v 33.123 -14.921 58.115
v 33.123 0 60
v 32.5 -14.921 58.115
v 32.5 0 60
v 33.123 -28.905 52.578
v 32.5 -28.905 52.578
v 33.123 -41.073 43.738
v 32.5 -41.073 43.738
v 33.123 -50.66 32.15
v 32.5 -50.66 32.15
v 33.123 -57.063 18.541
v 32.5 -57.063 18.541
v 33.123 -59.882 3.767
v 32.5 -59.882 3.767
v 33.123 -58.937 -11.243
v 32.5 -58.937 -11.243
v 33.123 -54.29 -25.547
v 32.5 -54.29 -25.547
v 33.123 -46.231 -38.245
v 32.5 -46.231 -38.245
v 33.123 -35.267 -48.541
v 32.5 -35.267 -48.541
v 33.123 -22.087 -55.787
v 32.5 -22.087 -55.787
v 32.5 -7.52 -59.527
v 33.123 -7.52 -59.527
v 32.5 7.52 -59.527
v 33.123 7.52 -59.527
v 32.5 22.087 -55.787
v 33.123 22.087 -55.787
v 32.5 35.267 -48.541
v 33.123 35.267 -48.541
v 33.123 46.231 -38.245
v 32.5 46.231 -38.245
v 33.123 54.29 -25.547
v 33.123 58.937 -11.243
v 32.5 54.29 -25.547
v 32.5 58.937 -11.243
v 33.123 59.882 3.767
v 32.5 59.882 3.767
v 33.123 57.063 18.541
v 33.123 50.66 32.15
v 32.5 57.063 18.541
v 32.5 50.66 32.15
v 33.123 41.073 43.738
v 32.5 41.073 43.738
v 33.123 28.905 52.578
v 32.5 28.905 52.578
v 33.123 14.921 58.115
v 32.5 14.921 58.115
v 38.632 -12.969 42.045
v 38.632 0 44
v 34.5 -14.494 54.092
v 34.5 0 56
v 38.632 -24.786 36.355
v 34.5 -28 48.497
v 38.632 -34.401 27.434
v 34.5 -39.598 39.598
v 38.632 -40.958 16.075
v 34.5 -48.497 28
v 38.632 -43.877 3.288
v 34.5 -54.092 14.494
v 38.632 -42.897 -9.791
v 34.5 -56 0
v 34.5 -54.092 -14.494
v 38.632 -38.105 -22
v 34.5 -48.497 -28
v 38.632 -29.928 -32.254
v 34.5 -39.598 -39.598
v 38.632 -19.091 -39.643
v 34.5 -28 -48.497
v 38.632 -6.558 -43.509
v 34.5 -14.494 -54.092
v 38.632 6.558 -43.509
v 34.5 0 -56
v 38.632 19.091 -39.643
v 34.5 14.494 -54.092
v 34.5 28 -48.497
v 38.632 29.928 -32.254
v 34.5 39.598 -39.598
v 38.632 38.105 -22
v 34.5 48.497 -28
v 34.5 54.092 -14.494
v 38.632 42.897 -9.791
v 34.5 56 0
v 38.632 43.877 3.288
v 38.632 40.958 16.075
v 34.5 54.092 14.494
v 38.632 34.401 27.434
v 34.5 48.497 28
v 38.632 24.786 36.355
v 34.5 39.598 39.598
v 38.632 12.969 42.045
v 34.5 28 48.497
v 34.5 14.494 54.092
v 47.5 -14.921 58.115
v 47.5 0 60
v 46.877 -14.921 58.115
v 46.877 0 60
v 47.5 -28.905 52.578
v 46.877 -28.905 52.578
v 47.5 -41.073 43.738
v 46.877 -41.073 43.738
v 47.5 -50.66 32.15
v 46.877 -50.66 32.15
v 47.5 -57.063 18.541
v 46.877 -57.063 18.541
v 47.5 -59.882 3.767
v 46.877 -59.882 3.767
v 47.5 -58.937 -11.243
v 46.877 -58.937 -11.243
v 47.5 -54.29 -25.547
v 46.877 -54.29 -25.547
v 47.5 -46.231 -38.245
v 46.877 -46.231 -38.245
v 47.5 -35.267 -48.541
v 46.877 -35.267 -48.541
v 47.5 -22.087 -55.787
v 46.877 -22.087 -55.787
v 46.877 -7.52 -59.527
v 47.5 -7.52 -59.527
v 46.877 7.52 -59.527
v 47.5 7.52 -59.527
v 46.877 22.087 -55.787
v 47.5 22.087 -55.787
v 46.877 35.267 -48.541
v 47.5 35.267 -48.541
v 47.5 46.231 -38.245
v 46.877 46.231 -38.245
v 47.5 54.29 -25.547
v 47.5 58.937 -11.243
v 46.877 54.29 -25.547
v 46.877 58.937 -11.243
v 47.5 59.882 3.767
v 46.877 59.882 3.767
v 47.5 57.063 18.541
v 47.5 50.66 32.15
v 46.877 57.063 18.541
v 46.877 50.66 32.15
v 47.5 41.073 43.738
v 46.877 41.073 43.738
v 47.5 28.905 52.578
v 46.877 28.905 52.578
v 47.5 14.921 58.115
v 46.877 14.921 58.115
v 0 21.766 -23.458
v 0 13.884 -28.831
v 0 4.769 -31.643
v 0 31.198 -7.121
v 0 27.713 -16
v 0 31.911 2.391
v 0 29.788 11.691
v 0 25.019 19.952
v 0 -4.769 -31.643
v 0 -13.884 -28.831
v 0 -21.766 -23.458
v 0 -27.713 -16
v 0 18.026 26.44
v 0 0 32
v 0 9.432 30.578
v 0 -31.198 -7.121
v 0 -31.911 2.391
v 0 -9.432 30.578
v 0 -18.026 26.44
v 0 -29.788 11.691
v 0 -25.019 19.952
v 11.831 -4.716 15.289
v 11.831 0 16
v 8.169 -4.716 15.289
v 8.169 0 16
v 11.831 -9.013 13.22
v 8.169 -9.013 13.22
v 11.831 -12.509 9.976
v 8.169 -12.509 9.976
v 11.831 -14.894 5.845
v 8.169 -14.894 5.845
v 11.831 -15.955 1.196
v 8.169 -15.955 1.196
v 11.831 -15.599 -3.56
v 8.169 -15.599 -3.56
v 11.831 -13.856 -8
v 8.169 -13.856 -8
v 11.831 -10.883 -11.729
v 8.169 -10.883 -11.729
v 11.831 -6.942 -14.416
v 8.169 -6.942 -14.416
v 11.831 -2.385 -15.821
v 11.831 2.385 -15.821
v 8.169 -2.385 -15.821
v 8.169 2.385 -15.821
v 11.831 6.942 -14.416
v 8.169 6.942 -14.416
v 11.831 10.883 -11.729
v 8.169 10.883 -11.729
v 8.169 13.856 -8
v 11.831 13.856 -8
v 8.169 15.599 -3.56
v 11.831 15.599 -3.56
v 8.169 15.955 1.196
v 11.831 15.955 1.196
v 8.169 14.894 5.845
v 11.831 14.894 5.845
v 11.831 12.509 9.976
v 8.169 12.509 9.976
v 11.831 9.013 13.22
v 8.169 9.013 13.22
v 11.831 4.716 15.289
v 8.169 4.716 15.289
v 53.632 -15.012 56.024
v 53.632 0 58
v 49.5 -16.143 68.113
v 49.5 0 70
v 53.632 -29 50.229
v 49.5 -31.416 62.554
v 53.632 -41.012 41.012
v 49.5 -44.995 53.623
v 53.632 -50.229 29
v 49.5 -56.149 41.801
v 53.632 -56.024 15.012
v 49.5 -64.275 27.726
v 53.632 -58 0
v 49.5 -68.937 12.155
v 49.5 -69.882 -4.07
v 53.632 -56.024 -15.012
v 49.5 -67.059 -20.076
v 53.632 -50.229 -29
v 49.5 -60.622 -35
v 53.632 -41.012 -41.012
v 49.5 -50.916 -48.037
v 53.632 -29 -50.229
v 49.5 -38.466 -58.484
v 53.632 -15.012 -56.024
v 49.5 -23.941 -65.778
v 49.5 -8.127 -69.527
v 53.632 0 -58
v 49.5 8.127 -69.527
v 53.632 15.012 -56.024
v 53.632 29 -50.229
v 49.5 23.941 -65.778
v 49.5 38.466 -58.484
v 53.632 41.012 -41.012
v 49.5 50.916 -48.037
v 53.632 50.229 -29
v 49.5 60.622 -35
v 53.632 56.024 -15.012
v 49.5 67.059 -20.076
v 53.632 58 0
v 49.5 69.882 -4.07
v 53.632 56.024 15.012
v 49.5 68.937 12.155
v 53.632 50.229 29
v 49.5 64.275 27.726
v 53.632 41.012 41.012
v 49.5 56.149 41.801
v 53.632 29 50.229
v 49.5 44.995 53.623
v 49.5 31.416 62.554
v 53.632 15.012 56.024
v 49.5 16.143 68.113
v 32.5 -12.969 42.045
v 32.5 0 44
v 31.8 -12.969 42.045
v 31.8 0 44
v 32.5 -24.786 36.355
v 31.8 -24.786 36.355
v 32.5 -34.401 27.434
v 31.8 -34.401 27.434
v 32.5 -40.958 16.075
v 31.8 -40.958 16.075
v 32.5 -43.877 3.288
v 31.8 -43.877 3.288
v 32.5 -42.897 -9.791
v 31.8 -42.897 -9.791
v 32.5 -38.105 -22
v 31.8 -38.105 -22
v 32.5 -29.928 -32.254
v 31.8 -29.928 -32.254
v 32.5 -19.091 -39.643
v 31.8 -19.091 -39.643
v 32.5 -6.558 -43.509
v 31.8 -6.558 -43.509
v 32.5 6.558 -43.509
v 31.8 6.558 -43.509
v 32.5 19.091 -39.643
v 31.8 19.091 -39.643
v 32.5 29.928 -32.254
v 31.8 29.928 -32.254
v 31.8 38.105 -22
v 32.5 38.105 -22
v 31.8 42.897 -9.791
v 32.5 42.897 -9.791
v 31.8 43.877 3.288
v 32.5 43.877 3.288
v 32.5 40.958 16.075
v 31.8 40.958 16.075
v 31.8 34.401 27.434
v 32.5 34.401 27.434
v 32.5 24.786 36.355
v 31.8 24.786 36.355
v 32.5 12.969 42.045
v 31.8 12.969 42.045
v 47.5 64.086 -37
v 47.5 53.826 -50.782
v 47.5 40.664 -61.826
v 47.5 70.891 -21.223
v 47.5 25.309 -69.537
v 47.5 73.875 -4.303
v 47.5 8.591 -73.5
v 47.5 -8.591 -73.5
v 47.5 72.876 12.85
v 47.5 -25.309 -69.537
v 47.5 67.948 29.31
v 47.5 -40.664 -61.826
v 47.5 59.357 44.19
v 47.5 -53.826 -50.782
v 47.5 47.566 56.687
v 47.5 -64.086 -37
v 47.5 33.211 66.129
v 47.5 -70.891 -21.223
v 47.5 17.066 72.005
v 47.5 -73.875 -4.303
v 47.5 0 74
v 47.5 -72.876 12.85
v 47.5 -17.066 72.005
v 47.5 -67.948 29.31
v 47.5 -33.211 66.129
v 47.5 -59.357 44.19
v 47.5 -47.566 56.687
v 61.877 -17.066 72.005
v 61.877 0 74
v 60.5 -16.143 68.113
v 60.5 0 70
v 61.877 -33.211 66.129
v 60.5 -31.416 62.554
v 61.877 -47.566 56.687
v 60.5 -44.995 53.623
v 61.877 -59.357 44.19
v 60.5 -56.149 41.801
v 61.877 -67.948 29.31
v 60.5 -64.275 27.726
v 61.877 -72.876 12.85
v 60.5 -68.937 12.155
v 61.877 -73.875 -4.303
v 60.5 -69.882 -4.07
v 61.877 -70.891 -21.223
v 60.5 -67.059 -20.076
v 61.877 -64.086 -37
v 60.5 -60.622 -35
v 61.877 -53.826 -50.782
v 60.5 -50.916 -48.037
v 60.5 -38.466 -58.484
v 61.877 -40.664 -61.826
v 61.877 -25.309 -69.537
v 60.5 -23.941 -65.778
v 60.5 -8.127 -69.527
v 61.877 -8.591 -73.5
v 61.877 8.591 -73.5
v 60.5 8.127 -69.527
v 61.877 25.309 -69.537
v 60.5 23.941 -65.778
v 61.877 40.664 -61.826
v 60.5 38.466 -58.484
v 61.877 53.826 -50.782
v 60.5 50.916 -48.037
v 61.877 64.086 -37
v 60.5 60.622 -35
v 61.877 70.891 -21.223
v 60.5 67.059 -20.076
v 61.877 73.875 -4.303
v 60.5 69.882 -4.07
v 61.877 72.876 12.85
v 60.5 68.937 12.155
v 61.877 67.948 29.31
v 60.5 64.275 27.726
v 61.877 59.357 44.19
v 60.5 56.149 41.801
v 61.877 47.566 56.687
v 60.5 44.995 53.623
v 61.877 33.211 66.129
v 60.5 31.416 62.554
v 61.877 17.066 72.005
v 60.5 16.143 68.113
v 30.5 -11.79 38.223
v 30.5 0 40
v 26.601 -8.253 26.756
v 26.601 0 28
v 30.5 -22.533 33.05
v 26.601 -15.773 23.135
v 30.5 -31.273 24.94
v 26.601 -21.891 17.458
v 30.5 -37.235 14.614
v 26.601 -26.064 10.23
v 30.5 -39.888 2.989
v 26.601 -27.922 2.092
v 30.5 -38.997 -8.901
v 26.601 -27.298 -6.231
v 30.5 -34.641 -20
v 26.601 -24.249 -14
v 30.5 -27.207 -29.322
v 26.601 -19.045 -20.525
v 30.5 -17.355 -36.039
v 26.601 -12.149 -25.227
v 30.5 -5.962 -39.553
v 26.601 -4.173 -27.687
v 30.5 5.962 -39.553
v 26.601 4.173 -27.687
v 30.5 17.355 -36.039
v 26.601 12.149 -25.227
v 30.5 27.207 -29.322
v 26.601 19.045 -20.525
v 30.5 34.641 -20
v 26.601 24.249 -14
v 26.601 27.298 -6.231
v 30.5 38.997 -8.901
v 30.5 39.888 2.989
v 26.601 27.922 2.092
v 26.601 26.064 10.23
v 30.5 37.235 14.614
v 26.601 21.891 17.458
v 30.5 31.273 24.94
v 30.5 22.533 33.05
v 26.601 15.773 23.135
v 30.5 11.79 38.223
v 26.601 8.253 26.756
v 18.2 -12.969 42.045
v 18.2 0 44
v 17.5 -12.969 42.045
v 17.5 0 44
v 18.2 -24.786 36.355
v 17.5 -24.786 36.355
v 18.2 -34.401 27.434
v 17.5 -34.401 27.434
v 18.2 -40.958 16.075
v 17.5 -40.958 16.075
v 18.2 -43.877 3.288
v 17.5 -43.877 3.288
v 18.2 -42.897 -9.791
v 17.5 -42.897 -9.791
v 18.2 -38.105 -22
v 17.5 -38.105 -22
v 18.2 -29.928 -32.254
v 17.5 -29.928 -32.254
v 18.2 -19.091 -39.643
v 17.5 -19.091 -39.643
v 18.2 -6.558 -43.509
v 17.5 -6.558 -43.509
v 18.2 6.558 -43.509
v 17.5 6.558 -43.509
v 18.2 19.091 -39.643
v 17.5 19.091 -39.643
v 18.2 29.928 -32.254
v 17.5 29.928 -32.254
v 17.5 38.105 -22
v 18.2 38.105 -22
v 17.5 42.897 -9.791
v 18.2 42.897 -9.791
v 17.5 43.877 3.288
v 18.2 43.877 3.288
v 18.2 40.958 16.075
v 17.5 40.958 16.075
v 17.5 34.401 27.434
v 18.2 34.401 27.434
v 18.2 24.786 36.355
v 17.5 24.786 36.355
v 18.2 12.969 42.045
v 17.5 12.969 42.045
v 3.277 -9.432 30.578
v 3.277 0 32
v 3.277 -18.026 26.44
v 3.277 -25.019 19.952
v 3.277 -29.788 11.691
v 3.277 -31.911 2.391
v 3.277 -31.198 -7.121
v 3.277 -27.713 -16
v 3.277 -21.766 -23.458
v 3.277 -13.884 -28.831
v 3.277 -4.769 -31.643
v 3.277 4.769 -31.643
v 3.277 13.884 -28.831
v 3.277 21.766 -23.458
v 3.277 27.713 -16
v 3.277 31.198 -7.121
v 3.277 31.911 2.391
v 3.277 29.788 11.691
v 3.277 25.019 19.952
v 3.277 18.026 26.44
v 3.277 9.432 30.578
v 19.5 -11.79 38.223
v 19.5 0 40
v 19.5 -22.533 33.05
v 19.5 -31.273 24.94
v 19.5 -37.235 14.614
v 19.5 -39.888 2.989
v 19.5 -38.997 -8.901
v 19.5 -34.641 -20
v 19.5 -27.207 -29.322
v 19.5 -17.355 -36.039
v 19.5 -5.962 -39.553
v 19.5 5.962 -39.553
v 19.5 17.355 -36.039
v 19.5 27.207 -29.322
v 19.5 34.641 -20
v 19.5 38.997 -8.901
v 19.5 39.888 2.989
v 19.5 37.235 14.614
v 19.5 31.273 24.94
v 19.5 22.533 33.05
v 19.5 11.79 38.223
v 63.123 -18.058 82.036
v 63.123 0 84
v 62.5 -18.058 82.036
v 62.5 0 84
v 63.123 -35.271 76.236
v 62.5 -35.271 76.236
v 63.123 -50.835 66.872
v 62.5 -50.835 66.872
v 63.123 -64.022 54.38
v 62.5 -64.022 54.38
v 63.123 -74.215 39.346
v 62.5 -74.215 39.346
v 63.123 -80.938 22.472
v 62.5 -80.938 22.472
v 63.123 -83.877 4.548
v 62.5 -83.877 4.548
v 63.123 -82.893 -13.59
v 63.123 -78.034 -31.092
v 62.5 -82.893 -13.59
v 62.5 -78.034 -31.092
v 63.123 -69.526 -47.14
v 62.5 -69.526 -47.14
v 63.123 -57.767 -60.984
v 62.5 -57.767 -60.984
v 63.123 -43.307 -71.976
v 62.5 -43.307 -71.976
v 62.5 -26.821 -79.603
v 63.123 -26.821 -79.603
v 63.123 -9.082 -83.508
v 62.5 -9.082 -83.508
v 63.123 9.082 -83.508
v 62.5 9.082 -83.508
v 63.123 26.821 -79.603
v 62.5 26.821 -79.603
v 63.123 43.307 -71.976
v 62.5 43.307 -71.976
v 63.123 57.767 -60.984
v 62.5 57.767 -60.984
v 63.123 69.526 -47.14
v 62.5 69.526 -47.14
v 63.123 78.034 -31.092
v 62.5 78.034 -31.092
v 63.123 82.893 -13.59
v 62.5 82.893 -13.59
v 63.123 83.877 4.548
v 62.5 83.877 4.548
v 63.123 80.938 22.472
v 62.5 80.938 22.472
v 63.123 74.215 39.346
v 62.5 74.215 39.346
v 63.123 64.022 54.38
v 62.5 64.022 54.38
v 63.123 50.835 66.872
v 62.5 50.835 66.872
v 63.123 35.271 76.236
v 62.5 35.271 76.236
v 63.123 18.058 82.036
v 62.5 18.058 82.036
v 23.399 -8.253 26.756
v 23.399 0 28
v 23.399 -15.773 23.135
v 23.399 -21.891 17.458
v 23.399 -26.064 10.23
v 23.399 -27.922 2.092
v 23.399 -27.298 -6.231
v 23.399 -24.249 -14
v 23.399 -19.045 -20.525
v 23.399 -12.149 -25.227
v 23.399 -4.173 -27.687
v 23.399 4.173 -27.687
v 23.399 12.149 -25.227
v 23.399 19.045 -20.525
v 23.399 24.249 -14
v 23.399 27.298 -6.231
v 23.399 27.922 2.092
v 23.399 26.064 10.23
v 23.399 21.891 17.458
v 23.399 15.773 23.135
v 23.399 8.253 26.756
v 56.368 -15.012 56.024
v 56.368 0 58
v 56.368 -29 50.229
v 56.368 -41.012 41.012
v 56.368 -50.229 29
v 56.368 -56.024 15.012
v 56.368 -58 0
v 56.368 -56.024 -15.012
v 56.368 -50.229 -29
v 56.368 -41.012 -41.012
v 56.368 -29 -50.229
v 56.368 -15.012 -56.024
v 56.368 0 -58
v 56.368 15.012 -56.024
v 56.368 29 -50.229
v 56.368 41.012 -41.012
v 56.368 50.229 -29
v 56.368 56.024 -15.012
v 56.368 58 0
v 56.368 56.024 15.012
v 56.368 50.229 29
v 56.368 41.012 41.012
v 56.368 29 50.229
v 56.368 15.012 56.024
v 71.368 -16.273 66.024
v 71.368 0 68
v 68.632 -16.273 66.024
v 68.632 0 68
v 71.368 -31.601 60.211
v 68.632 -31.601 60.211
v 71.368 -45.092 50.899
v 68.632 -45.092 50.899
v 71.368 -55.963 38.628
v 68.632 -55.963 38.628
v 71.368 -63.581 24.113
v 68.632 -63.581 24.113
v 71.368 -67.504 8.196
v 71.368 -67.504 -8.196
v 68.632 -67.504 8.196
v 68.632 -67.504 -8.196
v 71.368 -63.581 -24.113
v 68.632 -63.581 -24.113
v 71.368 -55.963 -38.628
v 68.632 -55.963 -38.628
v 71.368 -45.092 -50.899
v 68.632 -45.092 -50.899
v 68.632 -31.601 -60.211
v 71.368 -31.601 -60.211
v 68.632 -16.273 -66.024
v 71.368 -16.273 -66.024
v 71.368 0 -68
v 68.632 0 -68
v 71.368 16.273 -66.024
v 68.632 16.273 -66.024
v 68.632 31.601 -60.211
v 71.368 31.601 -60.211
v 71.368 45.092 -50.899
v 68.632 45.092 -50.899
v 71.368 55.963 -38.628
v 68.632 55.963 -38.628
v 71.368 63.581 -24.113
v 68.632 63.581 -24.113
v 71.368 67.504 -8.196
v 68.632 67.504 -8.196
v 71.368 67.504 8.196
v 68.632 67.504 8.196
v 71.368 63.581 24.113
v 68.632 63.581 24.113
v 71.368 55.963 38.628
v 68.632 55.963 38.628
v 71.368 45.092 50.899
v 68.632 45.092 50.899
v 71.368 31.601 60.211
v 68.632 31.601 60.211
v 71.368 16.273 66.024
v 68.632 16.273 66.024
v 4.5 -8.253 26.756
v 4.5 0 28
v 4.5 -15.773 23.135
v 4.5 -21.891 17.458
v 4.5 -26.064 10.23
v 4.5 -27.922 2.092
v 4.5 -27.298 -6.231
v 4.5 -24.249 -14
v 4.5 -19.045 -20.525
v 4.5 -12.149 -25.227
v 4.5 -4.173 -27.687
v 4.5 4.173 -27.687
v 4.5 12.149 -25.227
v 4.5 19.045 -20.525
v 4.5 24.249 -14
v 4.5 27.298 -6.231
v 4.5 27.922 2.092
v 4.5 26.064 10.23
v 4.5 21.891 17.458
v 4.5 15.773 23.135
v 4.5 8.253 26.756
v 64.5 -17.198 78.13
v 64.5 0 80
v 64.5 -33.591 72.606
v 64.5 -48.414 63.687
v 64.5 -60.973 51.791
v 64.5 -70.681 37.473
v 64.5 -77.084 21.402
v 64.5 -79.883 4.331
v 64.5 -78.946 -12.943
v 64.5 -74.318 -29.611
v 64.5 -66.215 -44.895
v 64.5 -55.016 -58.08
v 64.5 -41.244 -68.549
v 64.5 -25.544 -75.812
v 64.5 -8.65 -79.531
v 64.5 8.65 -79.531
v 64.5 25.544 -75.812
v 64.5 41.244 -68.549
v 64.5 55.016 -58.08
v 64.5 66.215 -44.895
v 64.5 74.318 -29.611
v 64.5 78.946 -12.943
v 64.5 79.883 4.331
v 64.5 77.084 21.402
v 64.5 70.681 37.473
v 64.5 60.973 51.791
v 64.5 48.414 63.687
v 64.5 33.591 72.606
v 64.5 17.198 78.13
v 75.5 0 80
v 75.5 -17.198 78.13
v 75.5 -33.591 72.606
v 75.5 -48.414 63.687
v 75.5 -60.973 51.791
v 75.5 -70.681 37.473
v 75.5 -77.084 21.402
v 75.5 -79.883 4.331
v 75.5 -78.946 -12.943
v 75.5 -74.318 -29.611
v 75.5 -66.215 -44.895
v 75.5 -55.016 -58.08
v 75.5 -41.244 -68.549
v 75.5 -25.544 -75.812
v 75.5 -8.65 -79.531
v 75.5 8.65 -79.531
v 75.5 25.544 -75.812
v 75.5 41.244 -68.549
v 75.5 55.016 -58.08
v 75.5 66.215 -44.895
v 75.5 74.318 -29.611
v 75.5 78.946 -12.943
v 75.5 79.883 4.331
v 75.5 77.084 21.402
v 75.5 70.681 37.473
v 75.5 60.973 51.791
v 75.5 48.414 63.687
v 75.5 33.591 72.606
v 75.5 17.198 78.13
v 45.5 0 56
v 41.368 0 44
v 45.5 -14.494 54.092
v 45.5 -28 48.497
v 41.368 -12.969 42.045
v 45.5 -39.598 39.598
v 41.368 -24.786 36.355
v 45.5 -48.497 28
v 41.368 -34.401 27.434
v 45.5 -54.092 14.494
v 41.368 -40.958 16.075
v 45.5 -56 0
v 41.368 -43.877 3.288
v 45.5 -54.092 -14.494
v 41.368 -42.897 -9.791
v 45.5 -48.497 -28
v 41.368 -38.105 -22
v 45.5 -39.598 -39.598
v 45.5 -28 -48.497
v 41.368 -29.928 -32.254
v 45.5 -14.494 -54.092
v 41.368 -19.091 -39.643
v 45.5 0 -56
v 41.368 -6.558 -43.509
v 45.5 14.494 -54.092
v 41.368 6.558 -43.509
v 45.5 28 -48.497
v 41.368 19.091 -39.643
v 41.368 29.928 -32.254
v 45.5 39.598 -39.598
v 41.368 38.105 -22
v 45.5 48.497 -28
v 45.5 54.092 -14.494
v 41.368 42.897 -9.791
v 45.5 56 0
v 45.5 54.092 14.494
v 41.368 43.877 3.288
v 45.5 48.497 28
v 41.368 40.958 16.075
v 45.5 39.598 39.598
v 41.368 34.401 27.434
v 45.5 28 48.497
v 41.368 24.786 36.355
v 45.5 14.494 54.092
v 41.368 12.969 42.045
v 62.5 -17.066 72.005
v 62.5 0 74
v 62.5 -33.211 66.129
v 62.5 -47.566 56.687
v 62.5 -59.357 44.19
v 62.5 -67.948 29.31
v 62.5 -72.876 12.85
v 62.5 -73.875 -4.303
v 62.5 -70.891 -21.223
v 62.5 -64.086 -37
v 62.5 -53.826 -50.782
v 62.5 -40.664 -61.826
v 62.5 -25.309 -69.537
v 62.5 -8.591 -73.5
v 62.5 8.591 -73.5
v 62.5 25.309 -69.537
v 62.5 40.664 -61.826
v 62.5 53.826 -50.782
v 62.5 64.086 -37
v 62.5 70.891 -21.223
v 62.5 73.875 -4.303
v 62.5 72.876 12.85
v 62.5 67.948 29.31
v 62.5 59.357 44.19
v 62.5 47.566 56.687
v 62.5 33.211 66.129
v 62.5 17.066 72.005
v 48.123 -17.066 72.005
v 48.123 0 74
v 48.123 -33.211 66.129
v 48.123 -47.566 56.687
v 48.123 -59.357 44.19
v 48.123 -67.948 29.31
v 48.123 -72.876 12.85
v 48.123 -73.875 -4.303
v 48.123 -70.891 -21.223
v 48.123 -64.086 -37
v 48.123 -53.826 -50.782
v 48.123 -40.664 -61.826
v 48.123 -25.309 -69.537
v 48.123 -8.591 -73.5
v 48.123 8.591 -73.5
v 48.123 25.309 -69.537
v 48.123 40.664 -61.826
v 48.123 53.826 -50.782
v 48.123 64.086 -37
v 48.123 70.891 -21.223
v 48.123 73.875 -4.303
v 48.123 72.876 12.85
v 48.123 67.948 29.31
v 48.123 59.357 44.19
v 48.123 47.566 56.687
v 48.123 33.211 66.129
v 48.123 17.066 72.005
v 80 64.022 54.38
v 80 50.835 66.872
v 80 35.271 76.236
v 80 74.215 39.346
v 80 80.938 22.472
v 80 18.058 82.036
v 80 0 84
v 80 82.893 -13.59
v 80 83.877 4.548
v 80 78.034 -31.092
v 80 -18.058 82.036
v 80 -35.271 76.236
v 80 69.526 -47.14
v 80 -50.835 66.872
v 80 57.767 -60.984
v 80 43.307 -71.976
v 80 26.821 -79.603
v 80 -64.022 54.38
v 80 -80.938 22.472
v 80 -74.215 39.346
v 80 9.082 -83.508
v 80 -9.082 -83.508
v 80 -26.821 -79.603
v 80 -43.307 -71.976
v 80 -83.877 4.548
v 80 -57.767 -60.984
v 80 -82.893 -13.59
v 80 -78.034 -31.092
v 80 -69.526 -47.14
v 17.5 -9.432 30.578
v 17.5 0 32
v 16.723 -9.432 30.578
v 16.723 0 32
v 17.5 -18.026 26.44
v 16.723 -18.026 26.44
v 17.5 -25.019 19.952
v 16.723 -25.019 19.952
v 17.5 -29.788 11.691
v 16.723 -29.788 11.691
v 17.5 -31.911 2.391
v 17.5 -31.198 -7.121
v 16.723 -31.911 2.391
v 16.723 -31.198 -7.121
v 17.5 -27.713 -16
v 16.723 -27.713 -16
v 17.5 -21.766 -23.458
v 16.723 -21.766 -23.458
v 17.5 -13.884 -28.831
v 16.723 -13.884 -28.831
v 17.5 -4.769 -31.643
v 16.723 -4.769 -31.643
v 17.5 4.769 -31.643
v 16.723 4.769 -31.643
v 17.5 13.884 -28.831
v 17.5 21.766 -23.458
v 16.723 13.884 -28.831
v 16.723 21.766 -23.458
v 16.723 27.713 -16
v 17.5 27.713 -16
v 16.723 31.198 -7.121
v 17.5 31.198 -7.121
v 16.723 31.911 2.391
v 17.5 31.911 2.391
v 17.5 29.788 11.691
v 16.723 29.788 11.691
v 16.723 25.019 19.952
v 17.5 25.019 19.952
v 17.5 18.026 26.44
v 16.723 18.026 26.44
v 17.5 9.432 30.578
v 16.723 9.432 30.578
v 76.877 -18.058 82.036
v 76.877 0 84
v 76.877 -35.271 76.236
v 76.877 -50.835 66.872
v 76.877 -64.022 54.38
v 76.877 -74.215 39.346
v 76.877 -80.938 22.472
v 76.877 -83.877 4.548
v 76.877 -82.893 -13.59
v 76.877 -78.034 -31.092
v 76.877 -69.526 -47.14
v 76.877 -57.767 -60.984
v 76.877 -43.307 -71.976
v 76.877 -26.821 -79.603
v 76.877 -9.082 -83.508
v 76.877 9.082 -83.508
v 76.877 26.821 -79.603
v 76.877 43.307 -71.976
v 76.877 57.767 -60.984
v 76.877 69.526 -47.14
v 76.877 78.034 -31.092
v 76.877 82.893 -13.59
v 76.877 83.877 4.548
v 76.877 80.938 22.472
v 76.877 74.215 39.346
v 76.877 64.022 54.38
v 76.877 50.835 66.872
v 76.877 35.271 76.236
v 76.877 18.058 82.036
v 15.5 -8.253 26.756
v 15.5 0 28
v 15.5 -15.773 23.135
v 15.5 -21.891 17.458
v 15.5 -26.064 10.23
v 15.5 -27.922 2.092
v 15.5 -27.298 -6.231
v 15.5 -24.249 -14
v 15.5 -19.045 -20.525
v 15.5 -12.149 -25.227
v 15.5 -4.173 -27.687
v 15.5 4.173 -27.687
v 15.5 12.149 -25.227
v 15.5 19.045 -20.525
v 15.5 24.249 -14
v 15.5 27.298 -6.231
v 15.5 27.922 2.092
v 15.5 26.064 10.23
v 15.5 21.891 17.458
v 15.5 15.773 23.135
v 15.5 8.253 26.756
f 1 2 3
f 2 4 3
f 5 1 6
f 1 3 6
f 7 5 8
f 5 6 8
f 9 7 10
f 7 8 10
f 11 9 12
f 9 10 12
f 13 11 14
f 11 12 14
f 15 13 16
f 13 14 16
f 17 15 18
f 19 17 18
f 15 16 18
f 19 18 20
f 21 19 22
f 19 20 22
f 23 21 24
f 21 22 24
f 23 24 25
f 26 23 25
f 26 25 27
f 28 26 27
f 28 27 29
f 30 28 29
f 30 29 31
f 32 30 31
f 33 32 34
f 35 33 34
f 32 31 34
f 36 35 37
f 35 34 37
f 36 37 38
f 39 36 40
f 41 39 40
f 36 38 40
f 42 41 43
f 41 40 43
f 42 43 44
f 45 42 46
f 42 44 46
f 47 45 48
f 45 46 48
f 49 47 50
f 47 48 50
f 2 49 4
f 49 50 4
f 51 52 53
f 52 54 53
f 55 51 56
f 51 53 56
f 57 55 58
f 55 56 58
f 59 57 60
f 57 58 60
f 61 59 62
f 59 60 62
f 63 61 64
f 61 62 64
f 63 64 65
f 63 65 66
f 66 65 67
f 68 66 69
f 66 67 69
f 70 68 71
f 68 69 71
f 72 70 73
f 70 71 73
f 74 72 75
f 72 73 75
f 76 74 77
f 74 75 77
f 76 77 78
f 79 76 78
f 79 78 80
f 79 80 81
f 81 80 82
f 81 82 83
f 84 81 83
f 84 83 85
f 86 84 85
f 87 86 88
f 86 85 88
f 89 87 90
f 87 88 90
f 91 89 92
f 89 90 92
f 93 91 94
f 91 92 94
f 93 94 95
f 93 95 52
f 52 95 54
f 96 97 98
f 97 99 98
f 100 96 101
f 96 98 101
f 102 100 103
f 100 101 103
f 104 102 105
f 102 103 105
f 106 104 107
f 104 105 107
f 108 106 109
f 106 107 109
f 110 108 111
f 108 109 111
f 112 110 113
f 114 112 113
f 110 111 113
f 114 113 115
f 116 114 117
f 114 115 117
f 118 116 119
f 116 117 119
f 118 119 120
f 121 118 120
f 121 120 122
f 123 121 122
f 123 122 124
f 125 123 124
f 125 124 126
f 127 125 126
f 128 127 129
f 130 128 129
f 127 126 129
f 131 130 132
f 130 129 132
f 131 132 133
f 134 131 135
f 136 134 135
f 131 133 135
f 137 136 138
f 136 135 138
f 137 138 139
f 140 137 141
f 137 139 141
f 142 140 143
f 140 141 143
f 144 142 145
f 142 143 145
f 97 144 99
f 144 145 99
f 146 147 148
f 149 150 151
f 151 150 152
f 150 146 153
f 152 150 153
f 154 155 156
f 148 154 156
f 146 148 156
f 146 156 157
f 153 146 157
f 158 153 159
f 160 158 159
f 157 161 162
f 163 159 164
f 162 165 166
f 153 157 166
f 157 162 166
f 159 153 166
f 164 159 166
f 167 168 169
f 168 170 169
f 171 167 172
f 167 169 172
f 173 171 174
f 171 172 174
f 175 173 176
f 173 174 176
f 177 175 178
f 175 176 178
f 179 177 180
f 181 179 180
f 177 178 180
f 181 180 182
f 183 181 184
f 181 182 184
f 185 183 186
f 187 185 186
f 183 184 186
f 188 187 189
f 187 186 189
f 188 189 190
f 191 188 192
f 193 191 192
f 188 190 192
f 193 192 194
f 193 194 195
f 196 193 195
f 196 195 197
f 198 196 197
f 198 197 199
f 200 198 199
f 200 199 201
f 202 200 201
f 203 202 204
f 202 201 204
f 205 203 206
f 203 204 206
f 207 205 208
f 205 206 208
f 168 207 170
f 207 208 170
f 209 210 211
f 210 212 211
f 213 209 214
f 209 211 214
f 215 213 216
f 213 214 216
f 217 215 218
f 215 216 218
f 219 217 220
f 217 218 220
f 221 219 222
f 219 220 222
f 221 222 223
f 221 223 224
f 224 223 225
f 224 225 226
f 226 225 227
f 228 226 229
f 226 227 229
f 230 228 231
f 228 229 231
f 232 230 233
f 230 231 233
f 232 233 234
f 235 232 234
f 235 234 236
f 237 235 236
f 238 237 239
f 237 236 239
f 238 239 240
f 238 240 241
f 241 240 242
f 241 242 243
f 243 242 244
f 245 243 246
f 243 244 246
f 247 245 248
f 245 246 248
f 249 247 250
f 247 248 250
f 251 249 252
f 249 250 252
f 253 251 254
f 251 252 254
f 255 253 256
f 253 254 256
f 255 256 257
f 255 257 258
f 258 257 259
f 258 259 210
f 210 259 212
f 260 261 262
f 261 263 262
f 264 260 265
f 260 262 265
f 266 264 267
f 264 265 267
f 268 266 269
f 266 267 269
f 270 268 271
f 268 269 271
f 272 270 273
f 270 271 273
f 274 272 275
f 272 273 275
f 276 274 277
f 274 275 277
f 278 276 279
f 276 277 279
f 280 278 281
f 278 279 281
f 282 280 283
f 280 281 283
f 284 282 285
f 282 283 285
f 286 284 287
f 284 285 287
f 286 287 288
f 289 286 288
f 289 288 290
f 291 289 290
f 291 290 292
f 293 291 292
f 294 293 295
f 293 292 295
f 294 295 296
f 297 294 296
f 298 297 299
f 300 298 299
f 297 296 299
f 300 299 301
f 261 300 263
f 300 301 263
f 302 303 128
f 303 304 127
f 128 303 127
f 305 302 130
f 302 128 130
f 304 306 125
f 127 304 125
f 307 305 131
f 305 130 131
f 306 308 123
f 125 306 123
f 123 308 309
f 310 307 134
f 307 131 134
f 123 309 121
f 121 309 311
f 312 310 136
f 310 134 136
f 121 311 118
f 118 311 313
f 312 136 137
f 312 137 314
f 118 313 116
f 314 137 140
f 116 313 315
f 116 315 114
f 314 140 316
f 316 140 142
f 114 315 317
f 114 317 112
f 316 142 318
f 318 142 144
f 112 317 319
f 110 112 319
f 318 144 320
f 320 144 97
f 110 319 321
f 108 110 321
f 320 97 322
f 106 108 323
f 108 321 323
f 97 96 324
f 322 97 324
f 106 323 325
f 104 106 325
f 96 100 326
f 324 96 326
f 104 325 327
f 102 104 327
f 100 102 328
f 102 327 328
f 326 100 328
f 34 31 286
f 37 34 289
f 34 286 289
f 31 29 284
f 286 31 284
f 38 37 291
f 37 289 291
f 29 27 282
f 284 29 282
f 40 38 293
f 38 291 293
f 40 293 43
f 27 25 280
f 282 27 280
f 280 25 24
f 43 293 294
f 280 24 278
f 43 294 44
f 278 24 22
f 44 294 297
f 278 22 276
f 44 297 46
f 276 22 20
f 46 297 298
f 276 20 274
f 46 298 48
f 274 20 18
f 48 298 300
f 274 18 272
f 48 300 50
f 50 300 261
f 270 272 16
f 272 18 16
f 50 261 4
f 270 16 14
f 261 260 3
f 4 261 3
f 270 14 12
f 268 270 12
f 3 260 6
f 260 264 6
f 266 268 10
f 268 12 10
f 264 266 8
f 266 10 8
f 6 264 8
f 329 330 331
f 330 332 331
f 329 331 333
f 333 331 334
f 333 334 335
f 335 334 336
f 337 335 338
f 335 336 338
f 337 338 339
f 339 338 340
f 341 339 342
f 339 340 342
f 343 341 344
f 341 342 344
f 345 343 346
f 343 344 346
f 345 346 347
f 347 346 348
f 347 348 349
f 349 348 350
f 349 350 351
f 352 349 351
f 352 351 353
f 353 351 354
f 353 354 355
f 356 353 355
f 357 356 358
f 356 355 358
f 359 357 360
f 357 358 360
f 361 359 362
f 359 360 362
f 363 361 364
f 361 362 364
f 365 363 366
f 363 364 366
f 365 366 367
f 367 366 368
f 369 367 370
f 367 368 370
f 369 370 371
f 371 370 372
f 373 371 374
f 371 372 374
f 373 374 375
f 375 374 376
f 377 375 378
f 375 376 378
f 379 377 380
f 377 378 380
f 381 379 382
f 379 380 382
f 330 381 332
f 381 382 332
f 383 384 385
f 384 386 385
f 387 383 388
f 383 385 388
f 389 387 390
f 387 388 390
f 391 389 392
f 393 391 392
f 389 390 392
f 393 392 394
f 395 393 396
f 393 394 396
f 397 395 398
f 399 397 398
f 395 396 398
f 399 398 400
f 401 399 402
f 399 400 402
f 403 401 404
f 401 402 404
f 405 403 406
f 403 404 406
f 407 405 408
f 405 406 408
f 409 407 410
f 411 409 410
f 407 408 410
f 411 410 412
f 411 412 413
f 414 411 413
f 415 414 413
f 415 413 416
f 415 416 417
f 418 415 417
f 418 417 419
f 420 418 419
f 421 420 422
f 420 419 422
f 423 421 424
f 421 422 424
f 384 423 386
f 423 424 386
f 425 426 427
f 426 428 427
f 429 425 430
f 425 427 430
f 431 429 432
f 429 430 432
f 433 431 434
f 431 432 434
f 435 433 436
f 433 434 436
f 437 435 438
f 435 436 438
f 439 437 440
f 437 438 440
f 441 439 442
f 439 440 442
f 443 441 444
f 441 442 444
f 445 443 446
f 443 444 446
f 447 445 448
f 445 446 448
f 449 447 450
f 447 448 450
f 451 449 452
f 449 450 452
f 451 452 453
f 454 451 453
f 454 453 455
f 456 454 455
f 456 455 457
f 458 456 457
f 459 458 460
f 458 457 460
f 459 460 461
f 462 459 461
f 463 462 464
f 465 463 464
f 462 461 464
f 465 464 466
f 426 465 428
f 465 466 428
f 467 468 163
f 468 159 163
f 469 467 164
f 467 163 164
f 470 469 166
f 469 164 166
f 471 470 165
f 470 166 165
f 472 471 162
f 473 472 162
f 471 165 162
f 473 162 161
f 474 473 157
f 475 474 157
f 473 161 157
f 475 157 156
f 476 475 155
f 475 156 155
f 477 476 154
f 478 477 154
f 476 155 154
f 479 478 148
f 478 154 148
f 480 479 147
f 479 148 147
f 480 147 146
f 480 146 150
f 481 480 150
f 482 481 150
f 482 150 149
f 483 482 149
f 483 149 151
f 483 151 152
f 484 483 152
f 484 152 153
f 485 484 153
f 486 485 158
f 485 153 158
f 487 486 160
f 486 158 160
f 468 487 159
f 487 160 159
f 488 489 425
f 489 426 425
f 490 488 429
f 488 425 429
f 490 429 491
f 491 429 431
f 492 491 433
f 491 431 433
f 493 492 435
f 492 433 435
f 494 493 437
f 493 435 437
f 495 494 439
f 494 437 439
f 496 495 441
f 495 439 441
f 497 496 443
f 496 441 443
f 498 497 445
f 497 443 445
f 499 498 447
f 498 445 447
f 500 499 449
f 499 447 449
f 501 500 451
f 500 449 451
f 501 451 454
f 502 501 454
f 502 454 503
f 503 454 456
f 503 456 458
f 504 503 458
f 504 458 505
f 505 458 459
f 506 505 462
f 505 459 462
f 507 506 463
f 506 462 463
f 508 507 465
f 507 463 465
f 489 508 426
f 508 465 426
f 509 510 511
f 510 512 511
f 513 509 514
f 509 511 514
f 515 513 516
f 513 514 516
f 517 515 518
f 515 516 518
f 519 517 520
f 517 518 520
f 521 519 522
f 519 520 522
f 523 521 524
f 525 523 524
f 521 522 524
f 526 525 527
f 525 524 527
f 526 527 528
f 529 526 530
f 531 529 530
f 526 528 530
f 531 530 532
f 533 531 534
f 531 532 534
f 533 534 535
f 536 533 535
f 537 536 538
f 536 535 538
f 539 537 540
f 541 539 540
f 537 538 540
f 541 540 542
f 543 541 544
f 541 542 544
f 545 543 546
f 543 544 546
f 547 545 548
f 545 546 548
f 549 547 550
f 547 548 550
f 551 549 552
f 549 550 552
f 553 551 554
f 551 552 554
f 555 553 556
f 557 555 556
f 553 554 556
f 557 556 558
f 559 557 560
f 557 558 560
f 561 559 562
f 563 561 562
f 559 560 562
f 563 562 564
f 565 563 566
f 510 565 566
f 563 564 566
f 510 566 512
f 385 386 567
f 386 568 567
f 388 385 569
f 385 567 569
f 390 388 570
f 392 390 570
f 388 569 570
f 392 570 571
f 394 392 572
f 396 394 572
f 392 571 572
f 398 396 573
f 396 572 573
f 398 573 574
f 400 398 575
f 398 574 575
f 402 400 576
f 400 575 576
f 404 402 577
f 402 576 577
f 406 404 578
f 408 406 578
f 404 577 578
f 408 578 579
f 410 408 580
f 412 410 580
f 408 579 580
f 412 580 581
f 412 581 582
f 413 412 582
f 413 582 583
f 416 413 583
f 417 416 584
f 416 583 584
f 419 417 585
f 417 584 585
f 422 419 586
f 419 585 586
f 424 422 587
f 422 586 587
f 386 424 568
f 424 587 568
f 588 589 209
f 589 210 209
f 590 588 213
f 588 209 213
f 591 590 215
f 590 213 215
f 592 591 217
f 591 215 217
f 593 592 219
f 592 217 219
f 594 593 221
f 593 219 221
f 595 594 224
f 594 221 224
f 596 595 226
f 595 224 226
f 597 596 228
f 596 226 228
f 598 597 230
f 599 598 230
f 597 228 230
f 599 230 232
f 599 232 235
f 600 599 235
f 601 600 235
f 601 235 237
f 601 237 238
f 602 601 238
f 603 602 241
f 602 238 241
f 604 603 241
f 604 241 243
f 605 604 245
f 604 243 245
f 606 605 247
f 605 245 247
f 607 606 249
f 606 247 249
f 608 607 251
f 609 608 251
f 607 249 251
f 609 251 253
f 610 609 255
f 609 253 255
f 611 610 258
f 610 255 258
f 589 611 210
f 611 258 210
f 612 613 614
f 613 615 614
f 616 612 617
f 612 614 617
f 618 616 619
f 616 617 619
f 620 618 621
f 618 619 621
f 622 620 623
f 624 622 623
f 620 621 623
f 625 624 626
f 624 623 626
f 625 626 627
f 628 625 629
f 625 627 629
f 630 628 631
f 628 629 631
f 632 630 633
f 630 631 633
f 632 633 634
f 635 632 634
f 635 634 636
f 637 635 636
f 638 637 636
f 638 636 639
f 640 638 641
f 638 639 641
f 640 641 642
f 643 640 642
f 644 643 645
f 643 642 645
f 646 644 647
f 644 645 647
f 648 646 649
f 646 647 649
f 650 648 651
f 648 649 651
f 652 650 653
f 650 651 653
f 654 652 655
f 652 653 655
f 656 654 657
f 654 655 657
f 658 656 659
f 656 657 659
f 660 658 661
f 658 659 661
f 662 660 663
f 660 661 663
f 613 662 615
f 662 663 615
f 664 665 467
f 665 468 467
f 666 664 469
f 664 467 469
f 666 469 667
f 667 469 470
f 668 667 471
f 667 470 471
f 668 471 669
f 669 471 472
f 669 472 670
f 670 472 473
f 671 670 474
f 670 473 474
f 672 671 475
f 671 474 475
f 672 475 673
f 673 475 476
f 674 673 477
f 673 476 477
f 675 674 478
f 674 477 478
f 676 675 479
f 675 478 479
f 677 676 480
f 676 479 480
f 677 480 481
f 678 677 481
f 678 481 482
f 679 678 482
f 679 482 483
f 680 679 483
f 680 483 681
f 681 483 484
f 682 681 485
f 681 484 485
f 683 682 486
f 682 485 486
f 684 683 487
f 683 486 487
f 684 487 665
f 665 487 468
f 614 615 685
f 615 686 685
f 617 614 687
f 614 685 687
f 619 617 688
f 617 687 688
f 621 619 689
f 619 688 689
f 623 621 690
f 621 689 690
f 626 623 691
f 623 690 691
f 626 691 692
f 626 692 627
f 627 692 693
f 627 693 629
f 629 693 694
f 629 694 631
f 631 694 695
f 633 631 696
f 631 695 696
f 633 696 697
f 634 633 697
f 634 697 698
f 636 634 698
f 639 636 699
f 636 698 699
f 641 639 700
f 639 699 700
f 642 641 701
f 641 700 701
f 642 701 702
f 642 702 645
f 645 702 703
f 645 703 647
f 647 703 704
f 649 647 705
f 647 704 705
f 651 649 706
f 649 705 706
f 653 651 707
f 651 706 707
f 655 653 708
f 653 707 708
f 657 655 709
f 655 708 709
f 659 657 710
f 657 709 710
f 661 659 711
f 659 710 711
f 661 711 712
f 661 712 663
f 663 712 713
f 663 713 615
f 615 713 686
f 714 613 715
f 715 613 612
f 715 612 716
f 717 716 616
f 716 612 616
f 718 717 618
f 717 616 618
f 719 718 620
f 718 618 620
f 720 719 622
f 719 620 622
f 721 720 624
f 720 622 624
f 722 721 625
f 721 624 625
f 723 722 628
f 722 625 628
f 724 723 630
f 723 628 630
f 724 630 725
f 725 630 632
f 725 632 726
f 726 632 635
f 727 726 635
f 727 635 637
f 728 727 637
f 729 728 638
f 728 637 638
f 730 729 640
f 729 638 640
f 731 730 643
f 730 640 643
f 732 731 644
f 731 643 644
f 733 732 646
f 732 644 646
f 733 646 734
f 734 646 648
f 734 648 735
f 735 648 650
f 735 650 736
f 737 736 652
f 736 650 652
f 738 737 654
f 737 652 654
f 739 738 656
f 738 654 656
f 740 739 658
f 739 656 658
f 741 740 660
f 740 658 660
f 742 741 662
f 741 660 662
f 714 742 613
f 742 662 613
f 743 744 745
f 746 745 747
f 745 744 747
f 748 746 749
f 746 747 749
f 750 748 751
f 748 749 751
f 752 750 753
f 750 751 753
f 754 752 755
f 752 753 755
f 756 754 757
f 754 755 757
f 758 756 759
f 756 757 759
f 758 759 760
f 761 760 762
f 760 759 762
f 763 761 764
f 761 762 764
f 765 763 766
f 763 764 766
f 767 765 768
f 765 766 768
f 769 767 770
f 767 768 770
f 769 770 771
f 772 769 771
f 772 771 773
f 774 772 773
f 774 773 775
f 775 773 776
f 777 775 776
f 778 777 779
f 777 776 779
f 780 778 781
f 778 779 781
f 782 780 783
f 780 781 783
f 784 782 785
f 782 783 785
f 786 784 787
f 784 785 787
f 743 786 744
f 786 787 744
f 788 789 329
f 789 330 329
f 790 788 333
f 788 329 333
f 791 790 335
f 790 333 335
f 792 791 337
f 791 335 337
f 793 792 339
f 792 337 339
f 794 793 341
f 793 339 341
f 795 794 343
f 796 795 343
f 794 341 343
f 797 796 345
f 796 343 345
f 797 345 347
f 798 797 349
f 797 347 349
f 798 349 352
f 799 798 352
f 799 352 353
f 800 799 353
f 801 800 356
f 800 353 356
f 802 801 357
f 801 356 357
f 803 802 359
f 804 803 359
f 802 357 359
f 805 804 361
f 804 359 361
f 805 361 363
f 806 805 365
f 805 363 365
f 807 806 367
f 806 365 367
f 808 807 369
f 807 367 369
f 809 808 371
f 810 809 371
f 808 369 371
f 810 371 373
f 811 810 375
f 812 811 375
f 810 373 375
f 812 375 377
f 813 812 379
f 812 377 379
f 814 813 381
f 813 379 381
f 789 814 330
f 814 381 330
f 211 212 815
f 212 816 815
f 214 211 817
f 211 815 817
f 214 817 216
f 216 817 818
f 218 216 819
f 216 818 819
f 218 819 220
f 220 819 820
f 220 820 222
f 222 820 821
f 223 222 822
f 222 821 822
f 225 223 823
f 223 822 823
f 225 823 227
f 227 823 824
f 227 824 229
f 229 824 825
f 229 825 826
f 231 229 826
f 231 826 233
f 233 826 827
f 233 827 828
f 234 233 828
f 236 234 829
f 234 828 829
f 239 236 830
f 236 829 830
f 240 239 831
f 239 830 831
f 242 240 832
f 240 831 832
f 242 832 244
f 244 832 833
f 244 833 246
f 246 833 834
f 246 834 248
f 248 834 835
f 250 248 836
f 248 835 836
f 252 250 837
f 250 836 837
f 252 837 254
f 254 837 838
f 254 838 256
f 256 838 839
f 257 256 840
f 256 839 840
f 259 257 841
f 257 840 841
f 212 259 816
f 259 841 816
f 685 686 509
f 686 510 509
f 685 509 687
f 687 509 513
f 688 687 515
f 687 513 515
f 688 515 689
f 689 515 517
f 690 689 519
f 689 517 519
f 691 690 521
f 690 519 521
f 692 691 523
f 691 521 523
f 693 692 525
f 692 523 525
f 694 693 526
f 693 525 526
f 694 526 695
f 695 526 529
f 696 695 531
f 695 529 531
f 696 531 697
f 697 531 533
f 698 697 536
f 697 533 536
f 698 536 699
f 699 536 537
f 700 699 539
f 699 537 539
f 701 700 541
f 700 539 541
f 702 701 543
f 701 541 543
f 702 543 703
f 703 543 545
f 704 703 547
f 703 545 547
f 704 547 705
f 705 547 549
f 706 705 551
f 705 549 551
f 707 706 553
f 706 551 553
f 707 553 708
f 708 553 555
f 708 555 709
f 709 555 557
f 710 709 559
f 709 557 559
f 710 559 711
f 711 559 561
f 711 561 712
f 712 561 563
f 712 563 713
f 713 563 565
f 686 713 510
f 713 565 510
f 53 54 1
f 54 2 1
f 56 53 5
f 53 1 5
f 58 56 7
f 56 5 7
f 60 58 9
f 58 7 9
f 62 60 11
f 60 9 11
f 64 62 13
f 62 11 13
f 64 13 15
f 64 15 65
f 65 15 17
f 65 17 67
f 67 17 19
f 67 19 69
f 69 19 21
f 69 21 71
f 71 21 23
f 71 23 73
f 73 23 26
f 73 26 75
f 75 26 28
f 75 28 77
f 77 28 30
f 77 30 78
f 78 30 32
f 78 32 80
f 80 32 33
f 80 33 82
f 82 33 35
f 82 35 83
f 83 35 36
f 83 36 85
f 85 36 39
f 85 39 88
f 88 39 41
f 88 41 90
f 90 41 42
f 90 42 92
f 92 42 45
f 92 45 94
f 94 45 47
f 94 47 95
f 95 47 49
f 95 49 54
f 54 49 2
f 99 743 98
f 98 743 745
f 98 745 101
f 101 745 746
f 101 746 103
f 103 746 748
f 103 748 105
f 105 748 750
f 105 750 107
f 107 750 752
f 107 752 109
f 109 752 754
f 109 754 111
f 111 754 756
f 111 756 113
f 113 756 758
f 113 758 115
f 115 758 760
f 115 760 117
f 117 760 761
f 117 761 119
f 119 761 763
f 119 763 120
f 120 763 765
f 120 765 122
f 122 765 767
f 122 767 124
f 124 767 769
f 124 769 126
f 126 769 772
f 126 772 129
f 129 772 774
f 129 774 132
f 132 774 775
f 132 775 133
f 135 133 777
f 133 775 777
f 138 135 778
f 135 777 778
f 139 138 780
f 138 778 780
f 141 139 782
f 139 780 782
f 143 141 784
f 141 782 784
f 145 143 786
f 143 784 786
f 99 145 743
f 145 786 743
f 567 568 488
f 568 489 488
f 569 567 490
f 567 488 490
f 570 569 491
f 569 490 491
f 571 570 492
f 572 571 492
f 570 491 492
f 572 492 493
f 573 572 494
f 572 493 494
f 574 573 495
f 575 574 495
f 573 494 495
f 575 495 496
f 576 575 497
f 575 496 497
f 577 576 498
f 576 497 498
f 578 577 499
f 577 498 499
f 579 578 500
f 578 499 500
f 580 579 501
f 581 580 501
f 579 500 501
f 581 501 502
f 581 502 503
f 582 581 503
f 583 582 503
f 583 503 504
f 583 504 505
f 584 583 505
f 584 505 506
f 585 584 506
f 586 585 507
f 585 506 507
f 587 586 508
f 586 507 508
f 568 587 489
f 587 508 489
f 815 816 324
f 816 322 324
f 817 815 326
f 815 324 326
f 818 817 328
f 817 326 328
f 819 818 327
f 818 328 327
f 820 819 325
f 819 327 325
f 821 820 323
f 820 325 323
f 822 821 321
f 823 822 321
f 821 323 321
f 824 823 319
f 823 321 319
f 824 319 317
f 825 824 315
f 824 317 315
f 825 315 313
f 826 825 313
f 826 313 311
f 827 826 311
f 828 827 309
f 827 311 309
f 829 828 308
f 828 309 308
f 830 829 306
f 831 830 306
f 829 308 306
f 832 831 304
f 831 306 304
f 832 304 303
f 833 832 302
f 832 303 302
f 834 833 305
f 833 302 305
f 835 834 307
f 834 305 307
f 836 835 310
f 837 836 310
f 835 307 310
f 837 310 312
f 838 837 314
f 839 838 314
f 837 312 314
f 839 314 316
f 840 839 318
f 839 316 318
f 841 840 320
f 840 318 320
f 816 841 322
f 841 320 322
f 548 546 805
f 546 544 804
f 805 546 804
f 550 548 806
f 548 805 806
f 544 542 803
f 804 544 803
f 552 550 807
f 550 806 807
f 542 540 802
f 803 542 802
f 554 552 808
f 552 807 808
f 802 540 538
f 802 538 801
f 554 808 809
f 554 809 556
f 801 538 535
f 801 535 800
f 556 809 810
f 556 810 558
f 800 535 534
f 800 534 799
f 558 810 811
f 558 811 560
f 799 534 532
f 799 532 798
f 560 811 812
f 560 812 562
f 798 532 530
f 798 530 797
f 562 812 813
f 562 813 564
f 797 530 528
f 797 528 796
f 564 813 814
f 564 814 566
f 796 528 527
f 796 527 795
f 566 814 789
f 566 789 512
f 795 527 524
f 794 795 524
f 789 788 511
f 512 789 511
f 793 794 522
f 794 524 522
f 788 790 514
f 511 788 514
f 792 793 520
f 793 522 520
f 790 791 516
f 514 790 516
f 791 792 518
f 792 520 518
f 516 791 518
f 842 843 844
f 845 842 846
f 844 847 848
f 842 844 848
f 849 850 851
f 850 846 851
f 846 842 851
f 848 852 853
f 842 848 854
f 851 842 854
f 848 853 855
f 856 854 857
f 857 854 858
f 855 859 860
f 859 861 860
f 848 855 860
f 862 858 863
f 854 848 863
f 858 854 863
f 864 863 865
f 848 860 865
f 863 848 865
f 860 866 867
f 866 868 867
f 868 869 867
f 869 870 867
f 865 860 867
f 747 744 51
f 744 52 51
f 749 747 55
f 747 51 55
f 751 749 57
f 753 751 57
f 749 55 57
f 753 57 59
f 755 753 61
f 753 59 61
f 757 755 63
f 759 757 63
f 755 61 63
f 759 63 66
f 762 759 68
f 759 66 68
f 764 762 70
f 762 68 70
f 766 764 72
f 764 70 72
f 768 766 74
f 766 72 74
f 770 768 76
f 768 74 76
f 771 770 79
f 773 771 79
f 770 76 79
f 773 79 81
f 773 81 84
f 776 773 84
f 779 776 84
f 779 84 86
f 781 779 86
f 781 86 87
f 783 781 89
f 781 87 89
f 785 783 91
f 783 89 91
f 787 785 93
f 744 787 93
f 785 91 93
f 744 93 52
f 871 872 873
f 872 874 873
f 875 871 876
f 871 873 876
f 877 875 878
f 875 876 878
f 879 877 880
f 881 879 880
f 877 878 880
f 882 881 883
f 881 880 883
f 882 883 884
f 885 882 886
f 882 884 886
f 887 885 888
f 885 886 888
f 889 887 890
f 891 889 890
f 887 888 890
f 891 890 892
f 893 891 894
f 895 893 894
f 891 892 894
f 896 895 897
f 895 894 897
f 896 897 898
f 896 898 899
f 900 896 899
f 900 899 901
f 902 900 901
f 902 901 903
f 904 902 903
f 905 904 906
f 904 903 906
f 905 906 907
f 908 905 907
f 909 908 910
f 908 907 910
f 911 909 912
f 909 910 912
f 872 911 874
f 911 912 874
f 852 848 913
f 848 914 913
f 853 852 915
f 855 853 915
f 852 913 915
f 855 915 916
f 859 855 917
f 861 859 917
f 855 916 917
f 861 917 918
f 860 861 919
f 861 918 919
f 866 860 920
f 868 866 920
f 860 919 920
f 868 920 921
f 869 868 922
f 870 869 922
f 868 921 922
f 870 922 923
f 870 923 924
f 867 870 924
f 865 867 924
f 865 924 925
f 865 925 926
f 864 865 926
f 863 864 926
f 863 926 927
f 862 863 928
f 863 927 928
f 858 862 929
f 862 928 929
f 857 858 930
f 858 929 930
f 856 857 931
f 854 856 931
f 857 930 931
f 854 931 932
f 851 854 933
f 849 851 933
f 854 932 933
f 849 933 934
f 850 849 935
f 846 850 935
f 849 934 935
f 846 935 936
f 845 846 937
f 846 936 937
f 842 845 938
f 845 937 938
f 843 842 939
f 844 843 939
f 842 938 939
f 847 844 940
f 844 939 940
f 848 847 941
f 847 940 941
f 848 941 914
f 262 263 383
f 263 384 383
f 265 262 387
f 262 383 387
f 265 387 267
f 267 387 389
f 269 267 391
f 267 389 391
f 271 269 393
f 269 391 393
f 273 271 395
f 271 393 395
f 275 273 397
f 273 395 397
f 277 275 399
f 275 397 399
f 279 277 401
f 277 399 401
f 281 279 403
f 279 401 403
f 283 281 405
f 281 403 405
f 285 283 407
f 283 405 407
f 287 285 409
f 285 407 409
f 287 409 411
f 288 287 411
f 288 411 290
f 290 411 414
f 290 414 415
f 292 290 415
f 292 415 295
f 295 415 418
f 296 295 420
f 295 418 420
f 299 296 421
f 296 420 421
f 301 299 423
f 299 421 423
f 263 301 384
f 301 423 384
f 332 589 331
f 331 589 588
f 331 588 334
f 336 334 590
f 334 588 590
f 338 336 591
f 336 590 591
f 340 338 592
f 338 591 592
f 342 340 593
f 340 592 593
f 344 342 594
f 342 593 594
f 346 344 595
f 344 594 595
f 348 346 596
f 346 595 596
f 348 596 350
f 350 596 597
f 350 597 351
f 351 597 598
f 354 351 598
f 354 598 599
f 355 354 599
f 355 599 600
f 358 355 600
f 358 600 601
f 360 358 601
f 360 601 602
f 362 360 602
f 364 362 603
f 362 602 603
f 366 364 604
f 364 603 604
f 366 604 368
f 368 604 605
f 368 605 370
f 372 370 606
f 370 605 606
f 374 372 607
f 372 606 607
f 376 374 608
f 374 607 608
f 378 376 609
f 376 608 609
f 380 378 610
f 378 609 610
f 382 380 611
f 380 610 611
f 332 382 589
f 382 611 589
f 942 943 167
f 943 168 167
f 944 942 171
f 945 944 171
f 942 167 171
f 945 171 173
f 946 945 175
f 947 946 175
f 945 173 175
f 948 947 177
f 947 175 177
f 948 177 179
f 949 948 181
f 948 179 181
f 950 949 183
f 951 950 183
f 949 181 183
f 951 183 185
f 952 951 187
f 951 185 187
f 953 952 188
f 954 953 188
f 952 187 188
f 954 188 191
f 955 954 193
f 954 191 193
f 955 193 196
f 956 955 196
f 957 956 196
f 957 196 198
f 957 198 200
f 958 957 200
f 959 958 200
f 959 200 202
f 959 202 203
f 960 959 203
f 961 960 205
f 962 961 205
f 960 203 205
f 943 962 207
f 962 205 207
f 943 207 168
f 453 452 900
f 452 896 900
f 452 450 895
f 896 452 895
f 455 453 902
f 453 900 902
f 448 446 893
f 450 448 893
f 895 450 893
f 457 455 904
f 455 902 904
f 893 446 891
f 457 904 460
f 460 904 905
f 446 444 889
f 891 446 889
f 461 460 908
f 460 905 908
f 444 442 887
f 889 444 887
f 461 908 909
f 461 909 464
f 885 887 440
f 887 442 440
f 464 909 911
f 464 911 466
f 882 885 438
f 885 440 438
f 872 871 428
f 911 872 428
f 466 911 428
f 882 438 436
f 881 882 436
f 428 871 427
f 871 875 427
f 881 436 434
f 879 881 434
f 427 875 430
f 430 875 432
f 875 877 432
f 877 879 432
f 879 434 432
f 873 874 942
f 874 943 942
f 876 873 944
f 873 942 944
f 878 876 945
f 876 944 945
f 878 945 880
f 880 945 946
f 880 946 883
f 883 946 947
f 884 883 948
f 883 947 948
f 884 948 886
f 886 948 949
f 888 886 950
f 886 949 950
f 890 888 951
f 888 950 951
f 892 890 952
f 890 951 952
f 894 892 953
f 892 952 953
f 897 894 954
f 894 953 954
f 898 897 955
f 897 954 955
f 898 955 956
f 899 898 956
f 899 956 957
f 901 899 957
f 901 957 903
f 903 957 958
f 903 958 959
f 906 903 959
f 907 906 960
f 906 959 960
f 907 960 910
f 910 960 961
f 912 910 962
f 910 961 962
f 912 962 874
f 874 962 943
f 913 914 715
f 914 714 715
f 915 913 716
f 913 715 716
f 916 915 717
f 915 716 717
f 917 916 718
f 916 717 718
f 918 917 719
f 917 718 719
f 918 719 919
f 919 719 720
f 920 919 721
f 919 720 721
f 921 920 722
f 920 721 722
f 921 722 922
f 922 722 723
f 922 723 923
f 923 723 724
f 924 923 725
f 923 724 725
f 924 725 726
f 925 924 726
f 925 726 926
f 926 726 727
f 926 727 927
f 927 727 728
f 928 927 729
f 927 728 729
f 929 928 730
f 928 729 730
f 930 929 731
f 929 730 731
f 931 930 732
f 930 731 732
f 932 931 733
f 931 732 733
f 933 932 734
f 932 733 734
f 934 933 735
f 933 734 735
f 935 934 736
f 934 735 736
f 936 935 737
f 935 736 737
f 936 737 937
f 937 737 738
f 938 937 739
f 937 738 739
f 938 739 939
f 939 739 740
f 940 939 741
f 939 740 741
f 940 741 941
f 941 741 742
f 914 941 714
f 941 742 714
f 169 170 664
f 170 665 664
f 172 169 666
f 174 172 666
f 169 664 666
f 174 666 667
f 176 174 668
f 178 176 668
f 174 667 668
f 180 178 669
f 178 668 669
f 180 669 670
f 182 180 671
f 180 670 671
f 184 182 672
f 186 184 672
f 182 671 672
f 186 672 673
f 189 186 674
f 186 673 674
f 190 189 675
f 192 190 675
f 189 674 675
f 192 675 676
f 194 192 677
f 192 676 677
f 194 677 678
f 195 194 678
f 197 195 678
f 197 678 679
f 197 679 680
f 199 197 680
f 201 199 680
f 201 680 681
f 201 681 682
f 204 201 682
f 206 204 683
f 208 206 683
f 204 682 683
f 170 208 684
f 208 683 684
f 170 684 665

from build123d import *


with BuildPart() as f1:
    # F0 (on Front) → F1 (revolve)
    with BuildSketch(Plane.XZ):
        Polygon((0, 32), (0, 0), (80, 0), (80, 84), (76.87731, 84), (75.5, 80), (71.368069, 68), (68.631931, 68), (64.5, 80), (63.12269, 84), (62.5, 84), (62.5, 74), (61.87731, 74), (60.5, 70), (56.368069, 58), (53.631931, 58), (49.5, 70), (48.12269, 74), (47.5, 74), (47.5, 60), (46.87731, 60), (45.5, 56), (41.368069, 44), (38.631931, 44), (34.5, 56), (33.12269, 60), (32.5, 60), (32.5, 44), (31.799679, 44), (30.5, 40), (26.600964, 28), (23.399036, 28), (19.5, 40), (18.200321, 44), (17.5, 44), (17.5, 32), (16.722923, 32), (15.5, 28), (11.831232, 16), (8.168768, 16), (4.5, 28), (3.277077, 32), align=None)
    revolve(axis=Axis((40, 0, 0), (1, 0, 0)))


solid = f1.part
